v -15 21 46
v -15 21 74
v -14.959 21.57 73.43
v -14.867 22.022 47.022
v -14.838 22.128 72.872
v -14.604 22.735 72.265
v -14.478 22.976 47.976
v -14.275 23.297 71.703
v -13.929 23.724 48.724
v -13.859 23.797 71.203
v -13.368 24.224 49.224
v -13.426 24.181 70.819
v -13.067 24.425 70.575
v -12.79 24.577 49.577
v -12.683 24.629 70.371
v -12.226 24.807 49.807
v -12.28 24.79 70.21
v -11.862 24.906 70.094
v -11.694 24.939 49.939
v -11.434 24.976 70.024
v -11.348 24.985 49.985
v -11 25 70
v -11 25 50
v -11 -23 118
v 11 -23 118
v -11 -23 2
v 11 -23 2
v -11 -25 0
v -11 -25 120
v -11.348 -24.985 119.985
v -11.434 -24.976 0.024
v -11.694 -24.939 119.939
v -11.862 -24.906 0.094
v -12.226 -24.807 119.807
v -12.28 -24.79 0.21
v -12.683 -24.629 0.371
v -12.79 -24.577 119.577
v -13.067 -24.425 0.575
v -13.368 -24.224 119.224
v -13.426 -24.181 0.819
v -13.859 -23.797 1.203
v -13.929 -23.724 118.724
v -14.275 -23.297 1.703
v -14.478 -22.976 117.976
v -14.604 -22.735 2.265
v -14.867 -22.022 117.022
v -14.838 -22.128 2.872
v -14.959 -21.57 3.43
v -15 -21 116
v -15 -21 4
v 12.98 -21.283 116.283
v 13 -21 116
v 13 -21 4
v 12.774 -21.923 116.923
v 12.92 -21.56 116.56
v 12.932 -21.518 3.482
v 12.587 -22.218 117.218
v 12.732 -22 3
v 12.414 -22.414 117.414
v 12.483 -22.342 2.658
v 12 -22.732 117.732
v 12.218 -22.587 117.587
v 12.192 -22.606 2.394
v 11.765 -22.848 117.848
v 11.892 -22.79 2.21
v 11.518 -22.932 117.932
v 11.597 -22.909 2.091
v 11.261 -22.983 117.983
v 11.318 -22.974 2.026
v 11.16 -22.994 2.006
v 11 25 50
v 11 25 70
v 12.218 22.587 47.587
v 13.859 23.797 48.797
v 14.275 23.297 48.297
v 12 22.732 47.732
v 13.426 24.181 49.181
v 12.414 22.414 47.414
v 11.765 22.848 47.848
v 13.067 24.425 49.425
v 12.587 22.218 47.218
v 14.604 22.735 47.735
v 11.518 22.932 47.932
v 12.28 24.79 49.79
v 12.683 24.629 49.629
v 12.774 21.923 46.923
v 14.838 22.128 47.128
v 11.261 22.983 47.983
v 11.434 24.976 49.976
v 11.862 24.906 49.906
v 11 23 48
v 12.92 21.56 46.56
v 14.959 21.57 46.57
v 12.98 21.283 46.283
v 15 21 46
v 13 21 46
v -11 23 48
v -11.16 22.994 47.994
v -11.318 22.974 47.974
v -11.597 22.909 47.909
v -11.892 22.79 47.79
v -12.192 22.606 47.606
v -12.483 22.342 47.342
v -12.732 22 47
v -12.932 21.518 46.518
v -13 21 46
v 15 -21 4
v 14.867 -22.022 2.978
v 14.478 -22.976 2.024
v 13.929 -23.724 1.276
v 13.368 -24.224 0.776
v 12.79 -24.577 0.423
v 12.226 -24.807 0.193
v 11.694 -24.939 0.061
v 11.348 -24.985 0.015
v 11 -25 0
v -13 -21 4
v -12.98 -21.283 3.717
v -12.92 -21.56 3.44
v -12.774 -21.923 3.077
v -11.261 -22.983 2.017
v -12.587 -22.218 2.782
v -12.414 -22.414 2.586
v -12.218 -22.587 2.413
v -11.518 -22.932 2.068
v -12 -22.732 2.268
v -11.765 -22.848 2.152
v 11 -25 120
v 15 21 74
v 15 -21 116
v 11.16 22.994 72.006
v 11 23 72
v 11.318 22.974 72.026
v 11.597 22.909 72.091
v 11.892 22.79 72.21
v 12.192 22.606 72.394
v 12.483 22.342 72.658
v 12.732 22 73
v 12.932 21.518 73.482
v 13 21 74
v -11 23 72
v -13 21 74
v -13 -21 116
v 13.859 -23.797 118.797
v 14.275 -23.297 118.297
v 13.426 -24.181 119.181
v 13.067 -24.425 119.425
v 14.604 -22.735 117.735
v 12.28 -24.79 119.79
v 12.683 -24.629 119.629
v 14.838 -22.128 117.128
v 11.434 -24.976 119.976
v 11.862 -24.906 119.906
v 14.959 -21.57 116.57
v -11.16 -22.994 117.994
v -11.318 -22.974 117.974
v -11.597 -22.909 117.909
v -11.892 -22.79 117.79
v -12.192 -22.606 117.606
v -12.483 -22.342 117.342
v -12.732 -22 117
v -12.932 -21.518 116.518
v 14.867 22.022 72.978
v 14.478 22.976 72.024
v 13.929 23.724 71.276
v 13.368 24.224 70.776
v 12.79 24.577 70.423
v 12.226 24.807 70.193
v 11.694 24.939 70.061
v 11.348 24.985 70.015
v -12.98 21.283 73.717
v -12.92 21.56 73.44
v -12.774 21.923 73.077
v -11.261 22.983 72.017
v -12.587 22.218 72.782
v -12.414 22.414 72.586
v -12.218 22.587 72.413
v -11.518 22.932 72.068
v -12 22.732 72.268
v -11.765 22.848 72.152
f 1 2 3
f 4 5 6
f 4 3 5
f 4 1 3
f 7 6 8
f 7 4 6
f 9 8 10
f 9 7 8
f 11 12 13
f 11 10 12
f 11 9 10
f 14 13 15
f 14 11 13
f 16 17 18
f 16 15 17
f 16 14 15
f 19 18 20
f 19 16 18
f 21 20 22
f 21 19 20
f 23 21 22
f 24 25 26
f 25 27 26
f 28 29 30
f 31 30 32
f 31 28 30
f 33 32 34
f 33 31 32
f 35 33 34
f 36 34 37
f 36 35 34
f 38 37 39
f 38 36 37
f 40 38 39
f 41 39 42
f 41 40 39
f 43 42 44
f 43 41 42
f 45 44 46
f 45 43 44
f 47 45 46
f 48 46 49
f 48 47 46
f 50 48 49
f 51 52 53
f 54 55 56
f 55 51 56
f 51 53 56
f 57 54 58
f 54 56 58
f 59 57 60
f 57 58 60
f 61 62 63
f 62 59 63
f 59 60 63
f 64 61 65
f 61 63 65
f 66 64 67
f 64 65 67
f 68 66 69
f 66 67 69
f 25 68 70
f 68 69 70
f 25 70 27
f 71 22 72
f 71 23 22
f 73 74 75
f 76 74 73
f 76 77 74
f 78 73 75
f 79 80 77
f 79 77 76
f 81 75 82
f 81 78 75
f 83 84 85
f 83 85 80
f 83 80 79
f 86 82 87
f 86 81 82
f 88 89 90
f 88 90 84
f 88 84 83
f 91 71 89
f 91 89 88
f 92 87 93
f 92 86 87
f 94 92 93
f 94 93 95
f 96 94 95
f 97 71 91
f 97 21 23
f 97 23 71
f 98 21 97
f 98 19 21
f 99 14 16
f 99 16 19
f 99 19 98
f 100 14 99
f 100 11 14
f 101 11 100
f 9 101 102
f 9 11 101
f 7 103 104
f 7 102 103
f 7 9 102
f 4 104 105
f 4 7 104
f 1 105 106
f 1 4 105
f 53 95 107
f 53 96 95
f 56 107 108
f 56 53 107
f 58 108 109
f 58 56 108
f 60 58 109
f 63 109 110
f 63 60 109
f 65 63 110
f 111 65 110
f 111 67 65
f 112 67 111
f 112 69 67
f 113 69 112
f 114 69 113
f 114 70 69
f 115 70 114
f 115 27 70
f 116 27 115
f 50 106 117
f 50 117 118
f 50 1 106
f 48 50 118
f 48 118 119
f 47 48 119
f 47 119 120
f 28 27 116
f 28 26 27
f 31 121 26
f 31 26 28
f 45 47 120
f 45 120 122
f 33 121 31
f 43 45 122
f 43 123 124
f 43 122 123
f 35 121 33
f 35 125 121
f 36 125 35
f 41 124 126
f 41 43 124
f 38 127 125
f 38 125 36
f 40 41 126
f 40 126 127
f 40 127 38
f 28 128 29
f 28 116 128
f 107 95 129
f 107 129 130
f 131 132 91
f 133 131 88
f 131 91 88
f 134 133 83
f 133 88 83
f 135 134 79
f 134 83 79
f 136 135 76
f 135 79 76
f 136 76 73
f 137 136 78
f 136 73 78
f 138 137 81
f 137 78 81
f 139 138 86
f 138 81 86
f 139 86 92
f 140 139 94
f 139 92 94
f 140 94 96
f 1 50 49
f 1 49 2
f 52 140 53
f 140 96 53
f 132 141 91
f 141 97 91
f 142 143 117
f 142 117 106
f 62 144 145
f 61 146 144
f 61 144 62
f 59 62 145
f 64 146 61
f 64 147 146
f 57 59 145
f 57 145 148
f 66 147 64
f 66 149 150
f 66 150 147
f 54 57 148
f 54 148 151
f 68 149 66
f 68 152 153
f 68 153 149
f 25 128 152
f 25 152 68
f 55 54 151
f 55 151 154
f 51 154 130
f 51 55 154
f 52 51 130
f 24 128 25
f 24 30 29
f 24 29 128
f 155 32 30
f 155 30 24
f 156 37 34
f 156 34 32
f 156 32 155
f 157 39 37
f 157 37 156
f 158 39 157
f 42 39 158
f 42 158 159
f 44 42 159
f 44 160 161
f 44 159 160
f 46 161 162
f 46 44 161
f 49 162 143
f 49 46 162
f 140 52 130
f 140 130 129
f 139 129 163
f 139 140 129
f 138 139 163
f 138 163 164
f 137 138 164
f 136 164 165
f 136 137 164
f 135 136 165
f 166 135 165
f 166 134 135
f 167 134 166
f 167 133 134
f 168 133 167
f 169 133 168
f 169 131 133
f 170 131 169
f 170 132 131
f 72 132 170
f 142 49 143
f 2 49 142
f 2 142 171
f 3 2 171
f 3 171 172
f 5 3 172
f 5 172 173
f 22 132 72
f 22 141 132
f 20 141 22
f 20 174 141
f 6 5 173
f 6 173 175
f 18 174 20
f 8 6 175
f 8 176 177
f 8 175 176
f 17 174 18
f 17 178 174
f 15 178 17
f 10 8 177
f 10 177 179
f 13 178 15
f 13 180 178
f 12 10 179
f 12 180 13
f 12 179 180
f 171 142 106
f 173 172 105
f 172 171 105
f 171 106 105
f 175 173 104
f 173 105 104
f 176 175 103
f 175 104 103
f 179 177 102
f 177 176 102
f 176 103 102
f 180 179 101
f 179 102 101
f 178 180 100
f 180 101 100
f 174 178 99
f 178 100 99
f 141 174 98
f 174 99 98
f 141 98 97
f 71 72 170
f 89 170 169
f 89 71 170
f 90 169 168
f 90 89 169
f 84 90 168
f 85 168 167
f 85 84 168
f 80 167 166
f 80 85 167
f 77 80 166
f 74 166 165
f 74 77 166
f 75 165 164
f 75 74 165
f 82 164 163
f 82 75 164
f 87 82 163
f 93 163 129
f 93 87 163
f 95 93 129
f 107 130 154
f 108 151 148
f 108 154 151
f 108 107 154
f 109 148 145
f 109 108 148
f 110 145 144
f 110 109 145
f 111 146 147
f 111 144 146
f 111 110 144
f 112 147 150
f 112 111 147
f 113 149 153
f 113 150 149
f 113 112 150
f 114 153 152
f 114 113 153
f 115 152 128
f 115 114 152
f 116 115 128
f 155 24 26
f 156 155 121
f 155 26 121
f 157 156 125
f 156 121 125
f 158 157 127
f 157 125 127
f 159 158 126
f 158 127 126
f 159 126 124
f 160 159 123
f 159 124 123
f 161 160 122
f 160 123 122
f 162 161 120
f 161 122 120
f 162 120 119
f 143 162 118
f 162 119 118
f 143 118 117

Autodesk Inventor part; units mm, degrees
ref_plane "Plano inicial" through (0, 0, 0) normal (0, 0, 1) x (1, 0, 0)
ref_plane "Plano final" through (0, 0, 120) normal (0, 0, 1) x (1, 0, 0)
sketch "Esboço" plane through (0, 0, 0) normal (0, 0, 1) x (1, 0, 0)
  line L0 (-15, -21) -> (-15, 21)
  line L1 (-11, 25) -> (11, 25)
  line L2 (15, 21) -> (15, -21)
  line L3 (11, -25) -> (-11, -25)
  arc A0 (-15, -21) -> (-11, -25) centre (-11, -21) ccw
  arc A1 (15, 21) -> (11, 25) centre (11, 21) ccw
  arc A2 (-11, 25) -> (-15, 21) centre (-11, 21) ccw
  arc A3 (11, -25) -> (15, -21) centre (11, -21) ccw
  arc A4 (-11, 23) -> (-13, 21) centre (-11, 21) ccw
  line L4 (-11, 23) -> (11, 23)
  arc A5 (13, 21) -> (11, 23) centre (11, 21) ccw
  line L5 (13, 21) -> (13, -21)
  arc A6 (11, -23) -> (13, -21) centre (11, -21) ccw
  line L6 (11, -23) -> (-11, -23)
  arc A7 (-13, -21) -> (-11, -23) centre (-11, -21) ccw
  line L7 (-13, -21) -> (-13, 21)
  line L8 (0, 36.1598) -> (0, -36.1598) construction
  line L9 (-22.1598, 0) -> (22.1598, 0) construction
  dimension "d7" = 4
  dimension "d9" = 30
  dimension "d11" = 50
  dimension "d12" = 2
  dimension "d15" = 15
  dimension "d16" = 25
extrude "Corpo" add sketch "Esboço" along normal up to surface (120 mm away) from surface at 0
sketch "Sketch3" plane through (0, 0, 0) normal (0, 0, 1) x (1, 0, 0)
  line L0 (0, 0) -> (10, 0)
ref_plane "Work Plane3" through (0, 0, 0) normal (0, -1, 0) x (1, 0, 0)
sketch "Sketch4" plane through (0, 0, 0) normal (0, -1, 0) x (1, 0, 0)
  line L0 (-2, 0) -> (12, 0)
  line L1 (-2, 120) -> (12, 120)
  dimension "d18" = 120
ref_plane "Plano de trabalho4" through (0, -25, 0) normal (0, 0.7071, -0.7071) x (1, 0, 0)
split "Dividir1" plane through (0, -25, 0) removes the side toward (0, 0.7071, -0.7071)
ref_plane "Plano de trabalho5" through (0, -25, 120) normal (0, 0.7071, 0.7071) x (1, 0, 0)
split "Dividir2" plane through (0, -25, 120) removes the side toward (0, 0.7071, 0.7071)
equation "\"d7\" = G_IR"
equation "\"d9\" = G_W"
equation "\"d11\" = G_H"
equation "\"d12\" = G_T"
equation "\"d15\" = 0.5 * d9"
equation "\"d16\" = 0.5 * d11"
equation "\"d3\" = G_L"
equation "\"G_W\" = 30"
equation "\"G_H\" = 50"
equation "\"G_T\" = 2"
equation "\"G_IR\" = 4"
equation "\"G_L\" = d18"
equation "\"G_OFFSET_START\" = 0"
equation "\"G_OFFSET_END\" = 0"
equation "\"d14\" = G_OFFSET_END + B_L"
equation "\"B_L\" = 120"
properties part number "ISO 4019 - 50x30x2 - 120" material "Aço, suave"
